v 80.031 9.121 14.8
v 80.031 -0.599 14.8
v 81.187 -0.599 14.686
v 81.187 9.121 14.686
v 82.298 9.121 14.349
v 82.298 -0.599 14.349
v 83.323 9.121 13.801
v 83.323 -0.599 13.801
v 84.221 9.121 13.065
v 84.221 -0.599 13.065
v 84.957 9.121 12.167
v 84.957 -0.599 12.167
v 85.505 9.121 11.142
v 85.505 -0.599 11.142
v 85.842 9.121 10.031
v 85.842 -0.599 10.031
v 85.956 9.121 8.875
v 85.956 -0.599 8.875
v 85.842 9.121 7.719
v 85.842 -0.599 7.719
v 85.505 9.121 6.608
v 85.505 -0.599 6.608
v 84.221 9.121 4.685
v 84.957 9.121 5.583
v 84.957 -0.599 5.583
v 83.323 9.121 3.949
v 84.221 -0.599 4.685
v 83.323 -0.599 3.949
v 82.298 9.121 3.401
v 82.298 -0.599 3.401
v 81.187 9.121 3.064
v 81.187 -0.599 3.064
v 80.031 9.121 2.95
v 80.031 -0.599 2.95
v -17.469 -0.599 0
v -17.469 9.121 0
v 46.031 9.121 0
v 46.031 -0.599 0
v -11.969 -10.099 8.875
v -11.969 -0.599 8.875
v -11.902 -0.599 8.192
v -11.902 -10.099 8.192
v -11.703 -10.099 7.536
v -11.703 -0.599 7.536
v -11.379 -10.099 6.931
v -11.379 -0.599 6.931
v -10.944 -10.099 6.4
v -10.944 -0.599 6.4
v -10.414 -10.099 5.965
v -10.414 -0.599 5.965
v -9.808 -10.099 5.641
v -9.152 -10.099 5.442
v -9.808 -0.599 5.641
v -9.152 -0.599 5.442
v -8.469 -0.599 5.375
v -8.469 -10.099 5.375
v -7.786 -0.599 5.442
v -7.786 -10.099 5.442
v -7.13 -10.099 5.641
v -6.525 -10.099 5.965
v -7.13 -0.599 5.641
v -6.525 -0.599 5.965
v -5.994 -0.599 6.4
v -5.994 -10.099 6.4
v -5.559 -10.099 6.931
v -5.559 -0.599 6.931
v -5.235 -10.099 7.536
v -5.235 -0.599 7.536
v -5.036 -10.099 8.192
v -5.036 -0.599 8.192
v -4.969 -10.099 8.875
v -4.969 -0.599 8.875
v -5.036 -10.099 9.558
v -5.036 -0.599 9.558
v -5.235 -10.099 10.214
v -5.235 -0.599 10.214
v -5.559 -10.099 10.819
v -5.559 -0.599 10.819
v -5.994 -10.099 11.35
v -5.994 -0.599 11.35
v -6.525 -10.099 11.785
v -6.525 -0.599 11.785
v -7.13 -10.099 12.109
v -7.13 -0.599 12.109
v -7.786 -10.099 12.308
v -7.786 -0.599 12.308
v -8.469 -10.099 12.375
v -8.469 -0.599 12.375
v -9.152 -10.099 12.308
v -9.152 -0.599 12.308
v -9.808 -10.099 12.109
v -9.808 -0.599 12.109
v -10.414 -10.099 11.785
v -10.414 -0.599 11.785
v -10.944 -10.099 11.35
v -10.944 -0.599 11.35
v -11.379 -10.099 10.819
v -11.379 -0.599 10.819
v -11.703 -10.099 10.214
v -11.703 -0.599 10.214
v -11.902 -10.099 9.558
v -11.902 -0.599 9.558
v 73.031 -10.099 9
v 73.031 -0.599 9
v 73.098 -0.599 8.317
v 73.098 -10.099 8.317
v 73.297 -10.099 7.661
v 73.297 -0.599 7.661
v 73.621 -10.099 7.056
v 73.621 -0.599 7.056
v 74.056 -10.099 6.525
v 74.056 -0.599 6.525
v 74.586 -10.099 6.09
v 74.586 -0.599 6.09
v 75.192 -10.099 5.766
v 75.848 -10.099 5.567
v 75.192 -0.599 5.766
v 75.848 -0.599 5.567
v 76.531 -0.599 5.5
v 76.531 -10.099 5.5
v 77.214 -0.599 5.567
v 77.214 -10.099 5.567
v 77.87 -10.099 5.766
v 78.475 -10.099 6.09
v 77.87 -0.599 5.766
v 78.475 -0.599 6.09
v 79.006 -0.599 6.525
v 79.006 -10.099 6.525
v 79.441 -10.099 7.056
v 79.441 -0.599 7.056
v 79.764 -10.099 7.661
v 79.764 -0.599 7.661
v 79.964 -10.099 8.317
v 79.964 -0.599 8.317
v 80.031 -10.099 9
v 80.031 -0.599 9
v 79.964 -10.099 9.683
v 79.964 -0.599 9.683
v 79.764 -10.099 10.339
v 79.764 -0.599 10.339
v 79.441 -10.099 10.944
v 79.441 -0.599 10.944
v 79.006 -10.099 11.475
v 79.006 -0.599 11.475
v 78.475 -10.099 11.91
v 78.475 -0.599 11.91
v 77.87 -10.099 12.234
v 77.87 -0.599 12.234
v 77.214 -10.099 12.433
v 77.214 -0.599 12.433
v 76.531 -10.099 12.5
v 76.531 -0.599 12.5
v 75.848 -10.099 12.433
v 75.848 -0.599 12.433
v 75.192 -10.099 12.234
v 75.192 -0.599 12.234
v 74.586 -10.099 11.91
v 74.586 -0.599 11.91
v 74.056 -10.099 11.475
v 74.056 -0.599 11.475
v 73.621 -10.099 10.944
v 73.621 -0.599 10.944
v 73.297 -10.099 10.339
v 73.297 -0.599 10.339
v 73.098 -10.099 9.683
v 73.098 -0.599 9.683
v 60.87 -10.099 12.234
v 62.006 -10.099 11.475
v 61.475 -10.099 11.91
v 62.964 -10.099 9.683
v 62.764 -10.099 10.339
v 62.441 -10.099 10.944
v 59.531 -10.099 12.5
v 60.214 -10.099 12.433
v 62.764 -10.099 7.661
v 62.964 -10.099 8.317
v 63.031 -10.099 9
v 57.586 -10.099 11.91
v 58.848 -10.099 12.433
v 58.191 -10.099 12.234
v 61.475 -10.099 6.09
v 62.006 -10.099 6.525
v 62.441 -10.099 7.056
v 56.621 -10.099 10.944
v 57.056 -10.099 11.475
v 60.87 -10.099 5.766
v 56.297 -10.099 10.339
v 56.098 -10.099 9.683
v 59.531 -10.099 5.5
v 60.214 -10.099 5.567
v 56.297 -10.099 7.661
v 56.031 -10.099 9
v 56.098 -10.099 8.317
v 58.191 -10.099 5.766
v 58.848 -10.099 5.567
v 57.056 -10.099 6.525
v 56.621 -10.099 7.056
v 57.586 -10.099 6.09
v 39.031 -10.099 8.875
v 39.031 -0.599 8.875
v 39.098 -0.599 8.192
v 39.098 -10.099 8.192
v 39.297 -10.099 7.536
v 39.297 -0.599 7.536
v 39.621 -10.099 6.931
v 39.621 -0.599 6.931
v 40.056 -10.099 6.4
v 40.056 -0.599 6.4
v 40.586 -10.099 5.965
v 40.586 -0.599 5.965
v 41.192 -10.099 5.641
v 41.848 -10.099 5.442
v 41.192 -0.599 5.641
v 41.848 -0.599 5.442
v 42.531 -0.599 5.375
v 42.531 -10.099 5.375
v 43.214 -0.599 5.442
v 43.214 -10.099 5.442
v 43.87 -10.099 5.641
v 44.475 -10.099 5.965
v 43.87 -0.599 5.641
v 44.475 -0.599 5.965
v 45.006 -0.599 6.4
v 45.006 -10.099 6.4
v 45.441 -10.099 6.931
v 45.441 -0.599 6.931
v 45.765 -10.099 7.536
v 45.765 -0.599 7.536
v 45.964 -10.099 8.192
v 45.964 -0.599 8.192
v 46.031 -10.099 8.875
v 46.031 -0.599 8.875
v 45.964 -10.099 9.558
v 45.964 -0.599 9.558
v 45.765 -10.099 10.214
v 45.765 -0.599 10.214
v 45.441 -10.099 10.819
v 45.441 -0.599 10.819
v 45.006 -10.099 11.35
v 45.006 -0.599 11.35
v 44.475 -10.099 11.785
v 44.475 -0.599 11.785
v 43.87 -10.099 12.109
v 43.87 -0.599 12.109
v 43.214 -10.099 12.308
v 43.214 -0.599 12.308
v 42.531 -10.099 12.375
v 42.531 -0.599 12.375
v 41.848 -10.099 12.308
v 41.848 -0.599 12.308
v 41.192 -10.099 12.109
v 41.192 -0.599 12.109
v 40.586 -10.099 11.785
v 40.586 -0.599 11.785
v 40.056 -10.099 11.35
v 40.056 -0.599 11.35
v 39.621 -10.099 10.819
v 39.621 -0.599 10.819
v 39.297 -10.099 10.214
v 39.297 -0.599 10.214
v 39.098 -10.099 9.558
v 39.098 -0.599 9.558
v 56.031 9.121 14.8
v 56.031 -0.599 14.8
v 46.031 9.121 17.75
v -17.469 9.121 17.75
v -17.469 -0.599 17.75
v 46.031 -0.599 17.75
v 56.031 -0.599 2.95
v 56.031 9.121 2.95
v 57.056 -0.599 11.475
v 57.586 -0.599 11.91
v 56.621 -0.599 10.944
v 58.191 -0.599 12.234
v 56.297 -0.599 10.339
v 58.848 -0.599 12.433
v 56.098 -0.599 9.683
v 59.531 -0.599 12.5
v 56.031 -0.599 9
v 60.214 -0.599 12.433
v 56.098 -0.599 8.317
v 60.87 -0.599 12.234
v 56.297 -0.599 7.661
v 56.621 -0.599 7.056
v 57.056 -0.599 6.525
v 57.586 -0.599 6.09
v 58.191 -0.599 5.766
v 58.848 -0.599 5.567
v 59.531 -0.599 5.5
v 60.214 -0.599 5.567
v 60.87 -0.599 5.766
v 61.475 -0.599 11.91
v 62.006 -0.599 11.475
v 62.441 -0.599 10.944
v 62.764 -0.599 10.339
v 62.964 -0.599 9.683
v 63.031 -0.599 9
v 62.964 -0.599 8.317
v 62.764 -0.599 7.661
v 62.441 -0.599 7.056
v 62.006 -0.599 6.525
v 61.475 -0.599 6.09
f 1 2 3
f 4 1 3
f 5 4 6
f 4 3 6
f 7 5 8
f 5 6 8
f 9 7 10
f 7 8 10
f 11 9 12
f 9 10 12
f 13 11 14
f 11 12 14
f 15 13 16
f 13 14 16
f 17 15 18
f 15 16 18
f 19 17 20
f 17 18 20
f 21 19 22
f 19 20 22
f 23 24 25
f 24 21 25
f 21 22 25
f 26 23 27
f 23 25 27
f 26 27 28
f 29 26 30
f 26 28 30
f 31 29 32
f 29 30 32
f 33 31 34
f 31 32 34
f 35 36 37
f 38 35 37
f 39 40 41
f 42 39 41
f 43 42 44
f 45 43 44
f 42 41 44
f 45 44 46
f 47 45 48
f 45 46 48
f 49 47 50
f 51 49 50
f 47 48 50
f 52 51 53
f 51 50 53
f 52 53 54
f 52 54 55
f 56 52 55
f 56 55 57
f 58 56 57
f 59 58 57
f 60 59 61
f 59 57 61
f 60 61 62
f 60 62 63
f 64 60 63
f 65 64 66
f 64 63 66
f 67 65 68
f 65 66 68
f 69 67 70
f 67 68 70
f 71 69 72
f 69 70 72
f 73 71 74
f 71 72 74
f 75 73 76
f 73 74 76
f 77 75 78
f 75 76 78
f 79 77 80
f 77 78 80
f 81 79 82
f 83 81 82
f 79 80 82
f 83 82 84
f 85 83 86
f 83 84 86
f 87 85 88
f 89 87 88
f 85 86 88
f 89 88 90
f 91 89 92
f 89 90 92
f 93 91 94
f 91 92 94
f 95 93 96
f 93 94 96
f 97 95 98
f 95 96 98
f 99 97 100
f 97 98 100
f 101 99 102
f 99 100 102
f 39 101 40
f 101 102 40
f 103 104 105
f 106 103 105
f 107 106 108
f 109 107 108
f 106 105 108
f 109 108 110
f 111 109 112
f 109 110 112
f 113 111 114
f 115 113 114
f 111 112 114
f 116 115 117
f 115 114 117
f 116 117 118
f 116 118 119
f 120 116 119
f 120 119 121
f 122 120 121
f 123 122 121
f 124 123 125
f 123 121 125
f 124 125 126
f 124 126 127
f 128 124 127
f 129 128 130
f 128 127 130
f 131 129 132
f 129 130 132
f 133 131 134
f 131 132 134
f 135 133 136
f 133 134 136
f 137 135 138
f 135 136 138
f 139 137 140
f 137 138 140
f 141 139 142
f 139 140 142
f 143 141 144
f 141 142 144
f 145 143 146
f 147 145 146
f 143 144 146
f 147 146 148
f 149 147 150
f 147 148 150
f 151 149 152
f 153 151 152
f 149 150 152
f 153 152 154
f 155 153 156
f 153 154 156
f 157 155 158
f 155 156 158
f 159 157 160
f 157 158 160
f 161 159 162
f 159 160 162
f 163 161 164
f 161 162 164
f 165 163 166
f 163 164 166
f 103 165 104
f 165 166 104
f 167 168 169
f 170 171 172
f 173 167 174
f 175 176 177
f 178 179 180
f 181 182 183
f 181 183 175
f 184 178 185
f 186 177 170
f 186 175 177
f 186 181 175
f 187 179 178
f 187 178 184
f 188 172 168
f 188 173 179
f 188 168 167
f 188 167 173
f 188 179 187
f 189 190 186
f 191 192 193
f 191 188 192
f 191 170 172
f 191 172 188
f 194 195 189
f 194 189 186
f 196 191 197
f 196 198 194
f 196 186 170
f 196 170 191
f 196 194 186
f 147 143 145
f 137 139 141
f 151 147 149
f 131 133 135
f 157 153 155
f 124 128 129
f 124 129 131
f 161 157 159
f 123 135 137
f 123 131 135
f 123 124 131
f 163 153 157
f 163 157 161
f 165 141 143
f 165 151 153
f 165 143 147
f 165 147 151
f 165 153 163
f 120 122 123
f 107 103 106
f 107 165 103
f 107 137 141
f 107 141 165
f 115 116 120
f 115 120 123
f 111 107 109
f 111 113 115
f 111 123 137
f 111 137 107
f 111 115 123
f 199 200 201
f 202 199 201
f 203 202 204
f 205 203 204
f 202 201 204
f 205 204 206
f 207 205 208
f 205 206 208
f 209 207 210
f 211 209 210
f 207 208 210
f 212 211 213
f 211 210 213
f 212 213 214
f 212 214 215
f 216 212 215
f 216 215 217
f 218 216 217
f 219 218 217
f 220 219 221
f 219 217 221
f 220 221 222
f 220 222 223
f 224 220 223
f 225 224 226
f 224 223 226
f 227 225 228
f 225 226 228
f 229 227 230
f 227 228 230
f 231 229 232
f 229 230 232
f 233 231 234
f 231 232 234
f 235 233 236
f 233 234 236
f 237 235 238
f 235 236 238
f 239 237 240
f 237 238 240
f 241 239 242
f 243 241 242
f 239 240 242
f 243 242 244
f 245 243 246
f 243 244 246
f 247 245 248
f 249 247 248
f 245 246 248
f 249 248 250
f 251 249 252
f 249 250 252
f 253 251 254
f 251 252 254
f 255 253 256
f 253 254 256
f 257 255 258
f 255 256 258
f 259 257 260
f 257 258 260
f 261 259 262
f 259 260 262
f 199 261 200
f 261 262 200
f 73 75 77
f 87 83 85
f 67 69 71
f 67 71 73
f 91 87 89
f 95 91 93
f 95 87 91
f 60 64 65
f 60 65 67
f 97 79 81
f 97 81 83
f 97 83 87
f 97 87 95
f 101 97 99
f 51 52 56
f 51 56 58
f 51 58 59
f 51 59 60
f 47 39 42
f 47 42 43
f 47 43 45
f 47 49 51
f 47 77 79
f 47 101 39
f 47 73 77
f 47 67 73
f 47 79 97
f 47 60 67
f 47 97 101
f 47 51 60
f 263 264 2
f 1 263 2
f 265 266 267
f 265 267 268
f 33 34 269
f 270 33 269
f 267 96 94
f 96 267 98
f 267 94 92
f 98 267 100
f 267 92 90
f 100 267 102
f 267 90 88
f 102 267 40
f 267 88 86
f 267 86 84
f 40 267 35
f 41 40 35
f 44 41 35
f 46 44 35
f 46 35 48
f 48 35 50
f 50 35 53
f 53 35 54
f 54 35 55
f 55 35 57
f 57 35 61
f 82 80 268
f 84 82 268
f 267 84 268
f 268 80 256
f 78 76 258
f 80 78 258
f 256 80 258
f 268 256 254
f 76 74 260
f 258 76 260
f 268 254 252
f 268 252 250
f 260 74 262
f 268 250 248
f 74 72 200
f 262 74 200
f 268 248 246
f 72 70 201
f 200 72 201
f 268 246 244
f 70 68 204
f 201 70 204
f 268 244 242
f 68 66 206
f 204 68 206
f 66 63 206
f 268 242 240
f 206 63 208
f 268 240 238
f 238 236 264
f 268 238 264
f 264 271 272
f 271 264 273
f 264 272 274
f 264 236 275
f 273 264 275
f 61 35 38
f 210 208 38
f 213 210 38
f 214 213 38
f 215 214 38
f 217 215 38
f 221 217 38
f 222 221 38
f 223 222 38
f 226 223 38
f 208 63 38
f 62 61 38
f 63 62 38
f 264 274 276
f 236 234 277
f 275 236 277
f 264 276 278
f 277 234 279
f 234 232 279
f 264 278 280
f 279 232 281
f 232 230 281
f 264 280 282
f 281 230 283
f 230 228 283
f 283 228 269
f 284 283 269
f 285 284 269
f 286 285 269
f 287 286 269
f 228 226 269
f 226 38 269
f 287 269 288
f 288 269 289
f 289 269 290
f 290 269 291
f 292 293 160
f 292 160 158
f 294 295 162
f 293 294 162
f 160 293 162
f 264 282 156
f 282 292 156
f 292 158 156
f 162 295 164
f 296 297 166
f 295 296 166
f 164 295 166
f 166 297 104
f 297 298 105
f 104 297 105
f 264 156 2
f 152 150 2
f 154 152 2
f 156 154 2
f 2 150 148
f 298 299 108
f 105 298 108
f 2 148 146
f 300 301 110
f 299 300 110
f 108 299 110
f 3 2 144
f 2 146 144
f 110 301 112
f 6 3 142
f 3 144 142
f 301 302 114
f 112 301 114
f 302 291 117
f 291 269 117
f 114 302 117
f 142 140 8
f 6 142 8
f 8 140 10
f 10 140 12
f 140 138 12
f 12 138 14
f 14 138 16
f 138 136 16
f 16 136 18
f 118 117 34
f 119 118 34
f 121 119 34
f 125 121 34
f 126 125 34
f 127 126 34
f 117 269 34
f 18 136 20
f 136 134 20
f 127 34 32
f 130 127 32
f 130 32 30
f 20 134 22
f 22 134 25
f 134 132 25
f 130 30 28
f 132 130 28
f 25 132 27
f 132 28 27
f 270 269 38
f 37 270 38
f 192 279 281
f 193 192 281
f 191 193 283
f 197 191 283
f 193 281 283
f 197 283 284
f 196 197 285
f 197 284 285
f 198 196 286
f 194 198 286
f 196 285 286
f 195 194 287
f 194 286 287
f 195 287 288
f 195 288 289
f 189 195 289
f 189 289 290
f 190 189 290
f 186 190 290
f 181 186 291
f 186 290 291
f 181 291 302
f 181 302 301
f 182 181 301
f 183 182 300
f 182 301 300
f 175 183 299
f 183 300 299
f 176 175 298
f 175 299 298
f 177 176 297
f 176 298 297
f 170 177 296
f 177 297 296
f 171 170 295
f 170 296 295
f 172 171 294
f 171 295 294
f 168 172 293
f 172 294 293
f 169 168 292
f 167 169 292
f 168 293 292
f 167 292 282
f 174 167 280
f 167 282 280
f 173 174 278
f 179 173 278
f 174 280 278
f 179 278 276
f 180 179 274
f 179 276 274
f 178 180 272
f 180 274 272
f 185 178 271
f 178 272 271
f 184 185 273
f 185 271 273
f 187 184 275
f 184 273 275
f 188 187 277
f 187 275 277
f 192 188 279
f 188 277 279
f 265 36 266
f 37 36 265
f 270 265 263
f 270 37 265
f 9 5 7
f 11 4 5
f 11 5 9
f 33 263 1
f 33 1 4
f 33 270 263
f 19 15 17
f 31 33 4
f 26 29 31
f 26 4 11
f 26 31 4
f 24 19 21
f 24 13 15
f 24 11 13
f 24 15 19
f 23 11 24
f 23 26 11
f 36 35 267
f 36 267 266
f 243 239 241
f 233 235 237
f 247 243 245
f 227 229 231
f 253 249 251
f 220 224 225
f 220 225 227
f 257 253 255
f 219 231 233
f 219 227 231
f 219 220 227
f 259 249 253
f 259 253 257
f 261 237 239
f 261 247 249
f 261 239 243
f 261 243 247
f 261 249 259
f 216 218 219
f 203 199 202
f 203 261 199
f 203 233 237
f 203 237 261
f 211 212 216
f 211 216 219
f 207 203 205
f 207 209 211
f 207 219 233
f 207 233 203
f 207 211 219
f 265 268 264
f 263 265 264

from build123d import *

# Parameters (mm, degrees)
SKETCH1_W           = 104
SKETCH1_H           = 9.72
BODY_DEPTH          = 17.75
FRONT_CUT_OUT_DEPTH = 89.865925518
SKETCH4_R           = 3.5
BOSS_EXTRUDE2_DEPTH = 9.5


with BuildPart() as part:
    # Sketch1 → body (new body)
    with BuildSketch(Plane.XY):
        with Locations((34.530987618, 4.261078665)):
            Rectangle(SKETCH1_W, SKETCH1_H)
    extrude(amount=BODY_DEPTH)

    # Sketch2 → front_cut_out (cut, through all)
    with BuildSketch(Plane.XZ.offset(0.598921335)):
        with BuildLine():
            Line((46.030987618, 17.75), (56.030987618, 14.8))
            Line((56.030987618, 14.8), (80.030987618, 14.8))
            ThreePointArc((80.030987618, 14.8), (85.955987618, 8.875), (80.030987618, 2.95))
            Line((80.030987618, 2.95), (56.030987618, 2.95))
            Line((56.030987618, 2.95), (46.030987618, 0))
            Line((46.030987618, 0), (86.530987618, 0))
            Line((86.530987618, 0), (86.530987618, 17.75))
            Line((86.530987618, 17.75), (46.030987618, 17.75))
        make_face()
    extrude(amount=-FRONT_CUT_OUT_DEPTH, mode=Mode.SUBTRACT)

    # Sketch4 → Boss-Extrude2 (add)
    with BuildSketch(Plane.XZ.offset(0.598921335)):
        with Locations(Location((-8.469012382, 8.875, 0), (0, 0, 180))):
            Circle(SKETCH4_R)
        with Locations(Location((42.530987618, 8.875, 0), (0, 0, 180))):
            Circle(SKETCH4_R)
        with Locations(Location((59.530872729, 9, 0), (0, 0, 180))):
            Circle(SKETCH4_R)
        with Locations(Location((76.530895707, 9, 0), (0, 0, 180))):
            Circle(SKETCH4_R)
    extrude(amount=BOSS_EXTRUDE2_DEPTH)


solid = part.part
